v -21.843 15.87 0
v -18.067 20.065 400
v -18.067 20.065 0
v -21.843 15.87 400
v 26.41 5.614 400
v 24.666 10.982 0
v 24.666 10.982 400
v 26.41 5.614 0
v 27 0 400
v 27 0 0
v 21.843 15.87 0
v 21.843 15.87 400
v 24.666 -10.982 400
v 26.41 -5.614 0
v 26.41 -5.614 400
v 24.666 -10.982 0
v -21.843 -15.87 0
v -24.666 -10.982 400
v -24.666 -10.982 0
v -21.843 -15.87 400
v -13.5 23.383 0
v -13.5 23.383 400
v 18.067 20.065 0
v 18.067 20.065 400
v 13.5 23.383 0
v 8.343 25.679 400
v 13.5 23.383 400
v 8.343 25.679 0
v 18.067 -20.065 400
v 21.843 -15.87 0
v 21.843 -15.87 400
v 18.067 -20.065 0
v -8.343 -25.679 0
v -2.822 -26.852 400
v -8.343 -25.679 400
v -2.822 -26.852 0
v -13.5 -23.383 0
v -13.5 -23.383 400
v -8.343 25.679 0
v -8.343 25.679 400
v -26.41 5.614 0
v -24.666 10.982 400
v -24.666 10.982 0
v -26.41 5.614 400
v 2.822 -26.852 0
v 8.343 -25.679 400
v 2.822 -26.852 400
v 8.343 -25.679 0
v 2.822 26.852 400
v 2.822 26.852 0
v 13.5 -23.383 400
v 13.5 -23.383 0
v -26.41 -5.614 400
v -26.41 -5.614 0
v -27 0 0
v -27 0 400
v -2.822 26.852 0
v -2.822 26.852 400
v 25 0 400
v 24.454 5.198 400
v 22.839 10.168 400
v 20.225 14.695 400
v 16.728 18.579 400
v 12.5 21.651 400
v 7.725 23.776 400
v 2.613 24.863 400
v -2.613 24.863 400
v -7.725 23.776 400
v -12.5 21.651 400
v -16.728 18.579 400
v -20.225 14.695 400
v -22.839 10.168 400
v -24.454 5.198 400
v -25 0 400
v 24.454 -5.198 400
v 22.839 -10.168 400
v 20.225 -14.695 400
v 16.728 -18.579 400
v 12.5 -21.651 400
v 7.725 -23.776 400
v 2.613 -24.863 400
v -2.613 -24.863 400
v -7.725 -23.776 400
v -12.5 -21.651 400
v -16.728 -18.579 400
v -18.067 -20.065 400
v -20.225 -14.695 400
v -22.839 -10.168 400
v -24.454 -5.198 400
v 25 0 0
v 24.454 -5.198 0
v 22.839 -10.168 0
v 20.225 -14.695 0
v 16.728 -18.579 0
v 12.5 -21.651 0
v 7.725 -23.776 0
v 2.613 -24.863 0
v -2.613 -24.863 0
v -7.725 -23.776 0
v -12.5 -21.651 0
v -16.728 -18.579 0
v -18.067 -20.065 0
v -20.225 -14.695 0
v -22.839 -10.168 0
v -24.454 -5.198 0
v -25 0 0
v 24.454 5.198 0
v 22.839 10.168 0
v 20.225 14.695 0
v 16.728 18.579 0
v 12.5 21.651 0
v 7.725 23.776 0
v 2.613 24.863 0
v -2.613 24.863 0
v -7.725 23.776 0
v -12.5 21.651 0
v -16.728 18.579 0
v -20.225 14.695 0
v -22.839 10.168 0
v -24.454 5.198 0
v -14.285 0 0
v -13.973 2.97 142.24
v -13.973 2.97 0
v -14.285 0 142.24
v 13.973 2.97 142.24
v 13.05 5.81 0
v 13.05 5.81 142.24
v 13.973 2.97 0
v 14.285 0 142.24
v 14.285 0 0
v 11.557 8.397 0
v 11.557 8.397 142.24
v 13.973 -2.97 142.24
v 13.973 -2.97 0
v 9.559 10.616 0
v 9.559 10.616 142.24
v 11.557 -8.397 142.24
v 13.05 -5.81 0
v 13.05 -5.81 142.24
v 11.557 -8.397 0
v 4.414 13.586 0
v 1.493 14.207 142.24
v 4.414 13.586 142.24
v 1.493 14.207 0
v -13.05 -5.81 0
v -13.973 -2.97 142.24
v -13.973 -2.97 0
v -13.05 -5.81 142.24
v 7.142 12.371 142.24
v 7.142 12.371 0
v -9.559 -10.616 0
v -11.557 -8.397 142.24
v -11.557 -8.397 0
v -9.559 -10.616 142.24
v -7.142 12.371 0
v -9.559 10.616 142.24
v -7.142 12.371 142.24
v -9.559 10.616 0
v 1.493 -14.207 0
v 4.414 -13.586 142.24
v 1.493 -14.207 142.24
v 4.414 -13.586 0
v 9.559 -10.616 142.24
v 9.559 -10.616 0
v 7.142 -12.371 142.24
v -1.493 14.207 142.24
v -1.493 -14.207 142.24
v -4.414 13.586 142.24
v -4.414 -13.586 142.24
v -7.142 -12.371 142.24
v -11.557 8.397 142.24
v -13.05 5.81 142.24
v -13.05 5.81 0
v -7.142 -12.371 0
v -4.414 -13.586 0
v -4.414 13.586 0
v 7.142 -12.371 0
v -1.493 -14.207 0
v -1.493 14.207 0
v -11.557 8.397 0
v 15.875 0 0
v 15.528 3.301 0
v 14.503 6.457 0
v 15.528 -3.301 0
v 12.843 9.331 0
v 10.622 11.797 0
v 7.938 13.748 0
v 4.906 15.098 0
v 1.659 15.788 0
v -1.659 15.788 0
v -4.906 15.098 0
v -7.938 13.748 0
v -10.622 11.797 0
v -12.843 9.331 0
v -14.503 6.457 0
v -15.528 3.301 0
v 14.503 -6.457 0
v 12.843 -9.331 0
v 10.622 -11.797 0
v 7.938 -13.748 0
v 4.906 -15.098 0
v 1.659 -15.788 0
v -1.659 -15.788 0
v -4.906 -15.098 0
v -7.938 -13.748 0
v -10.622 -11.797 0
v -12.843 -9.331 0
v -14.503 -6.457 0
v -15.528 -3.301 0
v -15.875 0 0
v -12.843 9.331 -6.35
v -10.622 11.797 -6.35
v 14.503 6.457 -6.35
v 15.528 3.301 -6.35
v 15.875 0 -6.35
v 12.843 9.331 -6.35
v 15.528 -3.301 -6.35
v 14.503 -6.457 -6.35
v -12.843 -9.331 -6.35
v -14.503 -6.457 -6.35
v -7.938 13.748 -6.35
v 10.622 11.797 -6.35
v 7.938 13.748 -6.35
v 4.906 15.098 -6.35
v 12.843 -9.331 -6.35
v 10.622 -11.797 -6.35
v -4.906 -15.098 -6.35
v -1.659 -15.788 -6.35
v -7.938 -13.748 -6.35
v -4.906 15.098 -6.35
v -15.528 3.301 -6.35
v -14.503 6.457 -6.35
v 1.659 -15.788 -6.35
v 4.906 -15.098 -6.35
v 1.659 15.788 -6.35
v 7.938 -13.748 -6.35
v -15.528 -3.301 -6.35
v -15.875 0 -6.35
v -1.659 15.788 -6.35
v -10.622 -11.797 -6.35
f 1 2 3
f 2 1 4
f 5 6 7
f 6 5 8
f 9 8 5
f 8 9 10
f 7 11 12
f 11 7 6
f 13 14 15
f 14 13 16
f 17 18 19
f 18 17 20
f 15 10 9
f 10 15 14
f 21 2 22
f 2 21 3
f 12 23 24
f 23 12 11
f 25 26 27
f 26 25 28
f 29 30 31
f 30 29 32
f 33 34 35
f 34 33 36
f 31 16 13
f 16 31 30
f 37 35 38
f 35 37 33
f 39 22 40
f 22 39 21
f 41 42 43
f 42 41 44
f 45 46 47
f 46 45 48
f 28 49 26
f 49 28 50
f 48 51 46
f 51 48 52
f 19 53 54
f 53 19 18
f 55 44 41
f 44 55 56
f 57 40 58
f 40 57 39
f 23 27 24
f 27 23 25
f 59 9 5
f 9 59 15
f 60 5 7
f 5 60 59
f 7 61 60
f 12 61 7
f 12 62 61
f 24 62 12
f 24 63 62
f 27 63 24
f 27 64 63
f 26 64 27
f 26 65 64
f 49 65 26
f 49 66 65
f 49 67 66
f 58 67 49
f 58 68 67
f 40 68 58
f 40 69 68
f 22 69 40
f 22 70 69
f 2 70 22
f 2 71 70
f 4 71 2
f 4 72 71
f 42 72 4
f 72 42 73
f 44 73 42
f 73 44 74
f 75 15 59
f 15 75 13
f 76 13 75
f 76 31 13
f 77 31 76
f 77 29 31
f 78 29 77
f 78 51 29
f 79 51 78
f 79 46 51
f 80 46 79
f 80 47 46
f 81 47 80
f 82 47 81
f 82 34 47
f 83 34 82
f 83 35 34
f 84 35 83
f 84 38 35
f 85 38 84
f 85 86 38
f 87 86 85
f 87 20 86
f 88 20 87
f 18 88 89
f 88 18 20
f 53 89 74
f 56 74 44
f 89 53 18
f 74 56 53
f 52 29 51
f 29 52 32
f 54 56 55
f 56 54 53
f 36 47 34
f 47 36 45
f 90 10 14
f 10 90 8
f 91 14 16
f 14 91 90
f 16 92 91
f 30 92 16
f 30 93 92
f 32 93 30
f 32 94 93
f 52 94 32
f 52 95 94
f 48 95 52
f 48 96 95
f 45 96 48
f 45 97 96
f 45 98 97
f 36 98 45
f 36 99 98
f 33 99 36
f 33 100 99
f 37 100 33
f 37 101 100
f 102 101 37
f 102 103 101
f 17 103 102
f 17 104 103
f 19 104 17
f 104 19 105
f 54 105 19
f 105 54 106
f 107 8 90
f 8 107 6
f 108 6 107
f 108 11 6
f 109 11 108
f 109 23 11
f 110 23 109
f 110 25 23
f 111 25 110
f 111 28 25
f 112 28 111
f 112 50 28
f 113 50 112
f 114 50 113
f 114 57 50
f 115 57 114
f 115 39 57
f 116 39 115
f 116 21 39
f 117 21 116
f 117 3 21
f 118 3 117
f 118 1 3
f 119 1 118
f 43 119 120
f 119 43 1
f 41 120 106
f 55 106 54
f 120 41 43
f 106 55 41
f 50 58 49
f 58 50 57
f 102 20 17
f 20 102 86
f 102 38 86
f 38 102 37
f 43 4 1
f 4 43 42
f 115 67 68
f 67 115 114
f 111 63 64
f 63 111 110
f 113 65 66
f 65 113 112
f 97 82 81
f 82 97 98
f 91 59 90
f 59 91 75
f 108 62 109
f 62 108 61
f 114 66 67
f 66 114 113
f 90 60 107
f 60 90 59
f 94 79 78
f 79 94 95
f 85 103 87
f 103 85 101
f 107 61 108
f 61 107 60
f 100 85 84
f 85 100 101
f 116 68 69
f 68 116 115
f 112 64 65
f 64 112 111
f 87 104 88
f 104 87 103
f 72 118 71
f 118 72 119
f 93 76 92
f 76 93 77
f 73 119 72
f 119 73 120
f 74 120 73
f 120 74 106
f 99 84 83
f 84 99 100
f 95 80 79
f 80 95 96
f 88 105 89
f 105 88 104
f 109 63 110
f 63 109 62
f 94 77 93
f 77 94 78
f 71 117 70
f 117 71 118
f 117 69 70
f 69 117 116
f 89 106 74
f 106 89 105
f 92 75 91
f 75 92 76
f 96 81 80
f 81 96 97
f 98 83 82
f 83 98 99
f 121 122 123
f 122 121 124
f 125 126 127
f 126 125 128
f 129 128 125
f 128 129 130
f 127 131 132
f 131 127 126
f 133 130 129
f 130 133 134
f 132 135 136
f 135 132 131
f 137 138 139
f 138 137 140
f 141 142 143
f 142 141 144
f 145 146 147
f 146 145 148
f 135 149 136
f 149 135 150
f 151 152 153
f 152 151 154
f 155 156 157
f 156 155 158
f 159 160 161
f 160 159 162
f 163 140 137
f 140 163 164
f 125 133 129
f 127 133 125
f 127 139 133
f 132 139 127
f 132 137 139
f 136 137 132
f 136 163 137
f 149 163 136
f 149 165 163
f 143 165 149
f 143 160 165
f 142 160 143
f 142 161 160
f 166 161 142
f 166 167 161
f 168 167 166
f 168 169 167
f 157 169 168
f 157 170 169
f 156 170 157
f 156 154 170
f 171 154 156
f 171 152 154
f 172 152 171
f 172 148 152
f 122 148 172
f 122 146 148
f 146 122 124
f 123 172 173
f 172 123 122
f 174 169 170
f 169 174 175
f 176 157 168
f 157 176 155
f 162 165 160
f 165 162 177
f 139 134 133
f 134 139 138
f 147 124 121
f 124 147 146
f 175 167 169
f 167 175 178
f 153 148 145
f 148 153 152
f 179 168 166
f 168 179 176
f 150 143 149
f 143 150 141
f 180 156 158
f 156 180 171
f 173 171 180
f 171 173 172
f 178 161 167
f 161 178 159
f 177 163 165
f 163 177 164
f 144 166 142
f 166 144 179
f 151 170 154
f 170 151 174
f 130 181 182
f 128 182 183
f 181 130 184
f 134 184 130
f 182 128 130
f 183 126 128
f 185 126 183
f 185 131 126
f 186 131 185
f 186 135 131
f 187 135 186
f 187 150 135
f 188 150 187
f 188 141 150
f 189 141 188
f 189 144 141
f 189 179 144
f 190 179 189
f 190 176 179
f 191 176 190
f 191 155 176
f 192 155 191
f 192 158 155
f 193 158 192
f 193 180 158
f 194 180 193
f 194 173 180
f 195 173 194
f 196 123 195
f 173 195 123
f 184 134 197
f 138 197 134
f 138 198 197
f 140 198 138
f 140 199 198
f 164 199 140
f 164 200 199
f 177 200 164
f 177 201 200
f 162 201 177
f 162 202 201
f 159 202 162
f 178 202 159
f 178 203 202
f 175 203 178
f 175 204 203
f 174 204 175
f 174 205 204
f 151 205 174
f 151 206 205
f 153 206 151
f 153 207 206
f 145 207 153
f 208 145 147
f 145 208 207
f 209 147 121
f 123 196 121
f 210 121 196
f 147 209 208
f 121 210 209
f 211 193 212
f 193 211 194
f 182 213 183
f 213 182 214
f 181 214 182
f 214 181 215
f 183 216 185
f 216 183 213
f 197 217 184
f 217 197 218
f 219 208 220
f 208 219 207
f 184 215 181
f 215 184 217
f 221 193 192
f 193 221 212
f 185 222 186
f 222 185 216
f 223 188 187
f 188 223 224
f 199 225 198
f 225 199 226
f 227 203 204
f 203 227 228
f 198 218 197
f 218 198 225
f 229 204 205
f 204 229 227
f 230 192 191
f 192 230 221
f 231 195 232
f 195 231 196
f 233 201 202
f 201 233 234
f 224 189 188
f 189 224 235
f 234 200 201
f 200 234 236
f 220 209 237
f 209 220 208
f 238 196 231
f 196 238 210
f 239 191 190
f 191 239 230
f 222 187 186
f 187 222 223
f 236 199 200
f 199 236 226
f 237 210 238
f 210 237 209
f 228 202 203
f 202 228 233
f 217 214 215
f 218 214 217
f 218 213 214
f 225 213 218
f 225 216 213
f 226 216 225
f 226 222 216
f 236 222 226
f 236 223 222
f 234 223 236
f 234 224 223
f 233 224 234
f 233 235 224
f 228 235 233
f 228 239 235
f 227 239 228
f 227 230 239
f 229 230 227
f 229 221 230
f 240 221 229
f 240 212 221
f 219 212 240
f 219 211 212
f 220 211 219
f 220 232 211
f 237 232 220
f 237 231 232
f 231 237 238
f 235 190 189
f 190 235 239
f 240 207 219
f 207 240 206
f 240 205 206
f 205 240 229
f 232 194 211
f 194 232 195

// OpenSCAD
// planning out the lower end of the APR21 rocket

module main_tube() {
    height = 400;
    o_dia = 54;
    i_dia = 50;
    difference() {
        cylinder(h=height,r=o_dia/2);
        translate([0,0,-0.5])
            cylinder(h=height+1,r=i_dia/2);
    }
}

module motor_casing() {
    motor_tube();
    motor_closure();
}

module motor_tube() {
    height = 142.24;
    dia = 28.57;
    cylinder(h=height,r=dia/2);
}

module motor_closure() {
    height = 6.35;
    dia = 31.75;
    translate([0,0,-height])
        cylinder(h=height,r=dia/2);
}

main_tube();
motor_casing();
